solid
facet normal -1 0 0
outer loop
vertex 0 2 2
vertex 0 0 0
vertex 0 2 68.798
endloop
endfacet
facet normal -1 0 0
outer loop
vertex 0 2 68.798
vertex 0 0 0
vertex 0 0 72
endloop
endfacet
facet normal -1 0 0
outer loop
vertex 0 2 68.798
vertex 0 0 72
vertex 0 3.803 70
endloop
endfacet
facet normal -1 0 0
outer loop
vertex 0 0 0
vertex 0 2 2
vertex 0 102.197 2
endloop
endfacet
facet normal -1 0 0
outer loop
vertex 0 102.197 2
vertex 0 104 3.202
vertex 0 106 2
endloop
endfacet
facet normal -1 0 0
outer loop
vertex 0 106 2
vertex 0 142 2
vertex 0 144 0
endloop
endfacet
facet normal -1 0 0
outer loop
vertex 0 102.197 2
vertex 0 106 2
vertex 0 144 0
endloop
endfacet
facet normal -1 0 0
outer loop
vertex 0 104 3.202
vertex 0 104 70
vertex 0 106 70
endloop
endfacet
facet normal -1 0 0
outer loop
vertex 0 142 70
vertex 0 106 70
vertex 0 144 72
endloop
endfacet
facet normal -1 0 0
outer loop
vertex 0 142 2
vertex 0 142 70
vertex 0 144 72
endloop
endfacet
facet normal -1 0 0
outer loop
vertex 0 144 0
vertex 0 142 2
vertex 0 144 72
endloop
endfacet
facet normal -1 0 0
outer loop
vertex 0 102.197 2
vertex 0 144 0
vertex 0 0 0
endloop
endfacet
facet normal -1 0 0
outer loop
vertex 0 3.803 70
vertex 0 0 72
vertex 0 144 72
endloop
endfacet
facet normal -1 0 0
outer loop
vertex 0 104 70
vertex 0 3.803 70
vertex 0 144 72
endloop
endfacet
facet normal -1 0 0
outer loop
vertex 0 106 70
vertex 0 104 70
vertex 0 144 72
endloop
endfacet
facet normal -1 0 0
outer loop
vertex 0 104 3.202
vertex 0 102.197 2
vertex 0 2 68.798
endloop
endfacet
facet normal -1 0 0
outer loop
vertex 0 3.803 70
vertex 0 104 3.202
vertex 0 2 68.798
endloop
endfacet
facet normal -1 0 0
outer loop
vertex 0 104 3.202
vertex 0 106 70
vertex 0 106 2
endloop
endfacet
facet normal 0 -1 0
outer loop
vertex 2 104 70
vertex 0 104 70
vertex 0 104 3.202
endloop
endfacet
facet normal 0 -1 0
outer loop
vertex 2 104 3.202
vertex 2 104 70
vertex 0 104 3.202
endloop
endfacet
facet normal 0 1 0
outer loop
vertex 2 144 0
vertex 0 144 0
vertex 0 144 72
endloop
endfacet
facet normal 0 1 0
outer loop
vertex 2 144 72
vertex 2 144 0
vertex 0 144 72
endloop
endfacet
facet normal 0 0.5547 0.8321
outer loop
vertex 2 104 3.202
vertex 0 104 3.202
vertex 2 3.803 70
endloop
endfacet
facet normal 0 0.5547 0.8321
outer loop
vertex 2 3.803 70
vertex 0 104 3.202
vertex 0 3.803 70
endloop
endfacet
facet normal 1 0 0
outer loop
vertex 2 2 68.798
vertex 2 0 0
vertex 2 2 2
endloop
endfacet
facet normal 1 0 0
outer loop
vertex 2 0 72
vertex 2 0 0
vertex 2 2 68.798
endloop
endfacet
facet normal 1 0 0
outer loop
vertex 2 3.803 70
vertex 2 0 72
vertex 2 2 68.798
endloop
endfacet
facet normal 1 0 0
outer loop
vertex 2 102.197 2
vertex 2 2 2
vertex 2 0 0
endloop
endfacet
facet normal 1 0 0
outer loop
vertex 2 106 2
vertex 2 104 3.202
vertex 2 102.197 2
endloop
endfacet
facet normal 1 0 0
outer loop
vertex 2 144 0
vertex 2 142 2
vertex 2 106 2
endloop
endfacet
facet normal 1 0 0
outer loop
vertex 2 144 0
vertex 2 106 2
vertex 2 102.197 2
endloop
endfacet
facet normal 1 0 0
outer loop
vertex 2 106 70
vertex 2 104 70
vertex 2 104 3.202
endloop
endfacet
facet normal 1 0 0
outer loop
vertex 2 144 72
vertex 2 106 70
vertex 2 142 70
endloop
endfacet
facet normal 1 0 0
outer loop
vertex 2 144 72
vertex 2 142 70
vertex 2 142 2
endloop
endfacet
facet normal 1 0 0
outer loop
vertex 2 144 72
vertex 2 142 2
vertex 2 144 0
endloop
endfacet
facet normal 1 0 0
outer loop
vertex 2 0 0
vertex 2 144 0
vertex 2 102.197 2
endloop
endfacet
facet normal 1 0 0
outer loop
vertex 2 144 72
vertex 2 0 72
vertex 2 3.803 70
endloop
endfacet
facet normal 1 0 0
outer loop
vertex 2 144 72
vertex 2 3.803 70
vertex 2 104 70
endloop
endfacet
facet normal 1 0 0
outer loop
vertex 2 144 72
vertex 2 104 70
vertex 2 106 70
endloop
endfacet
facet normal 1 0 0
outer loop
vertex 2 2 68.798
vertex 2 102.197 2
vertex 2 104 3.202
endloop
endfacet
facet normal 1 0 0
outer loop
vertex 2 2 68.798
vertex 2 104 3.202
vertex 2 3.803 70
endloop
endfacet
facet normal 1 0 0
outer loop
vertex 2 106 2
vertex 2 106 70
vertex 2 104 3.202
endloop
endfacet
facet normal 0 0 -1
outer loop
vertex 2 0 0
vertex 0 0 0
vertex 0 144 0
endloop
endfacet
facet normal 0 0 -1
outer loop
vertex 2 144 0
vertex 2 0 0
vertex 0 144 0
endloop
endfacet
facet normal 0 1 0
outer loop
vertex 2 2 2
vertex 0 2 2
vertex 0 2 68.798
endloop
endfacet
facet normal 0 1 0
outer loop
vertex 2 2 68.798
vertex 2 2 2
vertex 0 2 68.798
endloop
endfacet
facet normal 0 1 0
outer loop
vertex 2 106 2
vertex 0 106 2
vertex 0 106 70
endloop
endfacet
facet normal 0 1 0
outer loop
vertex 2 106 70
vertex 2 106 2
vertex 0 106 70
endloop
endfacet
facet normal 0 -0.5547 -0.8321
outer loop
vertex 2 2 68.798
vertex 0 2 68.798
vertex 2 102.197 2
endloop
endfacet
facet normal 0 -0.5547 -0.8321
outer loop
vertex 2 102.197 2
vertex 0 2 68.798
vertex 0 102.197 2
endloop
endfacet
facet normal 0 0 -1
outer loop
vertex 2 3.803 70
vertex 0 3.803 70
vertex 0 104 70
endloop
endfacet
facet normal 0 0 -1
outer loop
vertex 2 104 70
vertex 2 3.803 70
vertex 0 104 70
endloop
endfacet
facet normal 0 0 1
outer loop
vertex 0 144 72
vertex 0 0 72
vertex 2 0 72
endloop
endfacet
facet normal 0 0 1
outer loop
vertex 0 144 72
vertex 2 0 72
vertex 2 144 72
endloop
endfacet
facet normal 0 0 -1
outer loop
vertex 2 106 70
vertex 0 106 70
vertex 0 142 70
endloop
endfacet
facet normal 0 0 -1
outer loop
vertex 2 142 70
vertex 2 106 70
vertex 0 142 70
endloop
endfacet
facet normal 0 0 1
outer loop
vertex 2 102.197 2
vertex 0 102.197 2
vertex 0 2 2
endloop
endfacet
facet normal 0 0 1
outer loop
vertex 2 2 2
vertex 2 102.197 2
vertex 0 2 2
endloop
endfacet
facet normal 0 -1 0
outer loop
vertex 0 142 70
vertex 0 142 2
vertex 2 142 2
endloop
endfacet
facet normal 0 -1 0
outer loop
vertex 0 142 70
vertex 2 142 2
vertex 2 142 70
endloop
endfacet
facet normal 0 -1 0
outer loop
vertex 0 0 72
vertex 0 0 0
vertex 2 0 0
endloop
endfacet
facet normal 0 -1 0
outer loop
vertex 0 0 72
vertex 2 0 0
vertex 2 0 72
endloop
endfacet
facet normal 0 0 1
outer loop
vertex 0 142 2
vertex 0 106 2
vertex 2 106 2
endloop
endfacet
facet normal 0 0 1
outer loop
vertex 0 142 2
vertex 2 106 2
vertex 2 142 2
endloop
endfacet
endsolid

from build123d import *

# Parameters (mm, degrees)
F0_W     = 144
F0_H     = 72
F0_W_2   = 36
F0_H_2   = 68
F1_DEPTH = 2


with BuildPart() as f1:
    # F0 (on Right) → F1 (new body)
    with BuildSketch(Plane.YZ):
        with Locations((72, 36)):
            Rectangle(F0_W, F0_H)
        Polygon((2, 2), (2, 68.79815), (102.197224, 2), align=None, mode=Mode.SUBTRACT)
        Polygon((104, 70), (104, 3.20185), (3.802776, 70), align=None, mode=Mode.SUBTRACT)
        with Locations((124, 36)):
            Rectangle(F0_W_2, F0_H_2, mode=Mode.SUBTRACT)
    extrude(amount=F1_DEPTH)


solid = f1.part
